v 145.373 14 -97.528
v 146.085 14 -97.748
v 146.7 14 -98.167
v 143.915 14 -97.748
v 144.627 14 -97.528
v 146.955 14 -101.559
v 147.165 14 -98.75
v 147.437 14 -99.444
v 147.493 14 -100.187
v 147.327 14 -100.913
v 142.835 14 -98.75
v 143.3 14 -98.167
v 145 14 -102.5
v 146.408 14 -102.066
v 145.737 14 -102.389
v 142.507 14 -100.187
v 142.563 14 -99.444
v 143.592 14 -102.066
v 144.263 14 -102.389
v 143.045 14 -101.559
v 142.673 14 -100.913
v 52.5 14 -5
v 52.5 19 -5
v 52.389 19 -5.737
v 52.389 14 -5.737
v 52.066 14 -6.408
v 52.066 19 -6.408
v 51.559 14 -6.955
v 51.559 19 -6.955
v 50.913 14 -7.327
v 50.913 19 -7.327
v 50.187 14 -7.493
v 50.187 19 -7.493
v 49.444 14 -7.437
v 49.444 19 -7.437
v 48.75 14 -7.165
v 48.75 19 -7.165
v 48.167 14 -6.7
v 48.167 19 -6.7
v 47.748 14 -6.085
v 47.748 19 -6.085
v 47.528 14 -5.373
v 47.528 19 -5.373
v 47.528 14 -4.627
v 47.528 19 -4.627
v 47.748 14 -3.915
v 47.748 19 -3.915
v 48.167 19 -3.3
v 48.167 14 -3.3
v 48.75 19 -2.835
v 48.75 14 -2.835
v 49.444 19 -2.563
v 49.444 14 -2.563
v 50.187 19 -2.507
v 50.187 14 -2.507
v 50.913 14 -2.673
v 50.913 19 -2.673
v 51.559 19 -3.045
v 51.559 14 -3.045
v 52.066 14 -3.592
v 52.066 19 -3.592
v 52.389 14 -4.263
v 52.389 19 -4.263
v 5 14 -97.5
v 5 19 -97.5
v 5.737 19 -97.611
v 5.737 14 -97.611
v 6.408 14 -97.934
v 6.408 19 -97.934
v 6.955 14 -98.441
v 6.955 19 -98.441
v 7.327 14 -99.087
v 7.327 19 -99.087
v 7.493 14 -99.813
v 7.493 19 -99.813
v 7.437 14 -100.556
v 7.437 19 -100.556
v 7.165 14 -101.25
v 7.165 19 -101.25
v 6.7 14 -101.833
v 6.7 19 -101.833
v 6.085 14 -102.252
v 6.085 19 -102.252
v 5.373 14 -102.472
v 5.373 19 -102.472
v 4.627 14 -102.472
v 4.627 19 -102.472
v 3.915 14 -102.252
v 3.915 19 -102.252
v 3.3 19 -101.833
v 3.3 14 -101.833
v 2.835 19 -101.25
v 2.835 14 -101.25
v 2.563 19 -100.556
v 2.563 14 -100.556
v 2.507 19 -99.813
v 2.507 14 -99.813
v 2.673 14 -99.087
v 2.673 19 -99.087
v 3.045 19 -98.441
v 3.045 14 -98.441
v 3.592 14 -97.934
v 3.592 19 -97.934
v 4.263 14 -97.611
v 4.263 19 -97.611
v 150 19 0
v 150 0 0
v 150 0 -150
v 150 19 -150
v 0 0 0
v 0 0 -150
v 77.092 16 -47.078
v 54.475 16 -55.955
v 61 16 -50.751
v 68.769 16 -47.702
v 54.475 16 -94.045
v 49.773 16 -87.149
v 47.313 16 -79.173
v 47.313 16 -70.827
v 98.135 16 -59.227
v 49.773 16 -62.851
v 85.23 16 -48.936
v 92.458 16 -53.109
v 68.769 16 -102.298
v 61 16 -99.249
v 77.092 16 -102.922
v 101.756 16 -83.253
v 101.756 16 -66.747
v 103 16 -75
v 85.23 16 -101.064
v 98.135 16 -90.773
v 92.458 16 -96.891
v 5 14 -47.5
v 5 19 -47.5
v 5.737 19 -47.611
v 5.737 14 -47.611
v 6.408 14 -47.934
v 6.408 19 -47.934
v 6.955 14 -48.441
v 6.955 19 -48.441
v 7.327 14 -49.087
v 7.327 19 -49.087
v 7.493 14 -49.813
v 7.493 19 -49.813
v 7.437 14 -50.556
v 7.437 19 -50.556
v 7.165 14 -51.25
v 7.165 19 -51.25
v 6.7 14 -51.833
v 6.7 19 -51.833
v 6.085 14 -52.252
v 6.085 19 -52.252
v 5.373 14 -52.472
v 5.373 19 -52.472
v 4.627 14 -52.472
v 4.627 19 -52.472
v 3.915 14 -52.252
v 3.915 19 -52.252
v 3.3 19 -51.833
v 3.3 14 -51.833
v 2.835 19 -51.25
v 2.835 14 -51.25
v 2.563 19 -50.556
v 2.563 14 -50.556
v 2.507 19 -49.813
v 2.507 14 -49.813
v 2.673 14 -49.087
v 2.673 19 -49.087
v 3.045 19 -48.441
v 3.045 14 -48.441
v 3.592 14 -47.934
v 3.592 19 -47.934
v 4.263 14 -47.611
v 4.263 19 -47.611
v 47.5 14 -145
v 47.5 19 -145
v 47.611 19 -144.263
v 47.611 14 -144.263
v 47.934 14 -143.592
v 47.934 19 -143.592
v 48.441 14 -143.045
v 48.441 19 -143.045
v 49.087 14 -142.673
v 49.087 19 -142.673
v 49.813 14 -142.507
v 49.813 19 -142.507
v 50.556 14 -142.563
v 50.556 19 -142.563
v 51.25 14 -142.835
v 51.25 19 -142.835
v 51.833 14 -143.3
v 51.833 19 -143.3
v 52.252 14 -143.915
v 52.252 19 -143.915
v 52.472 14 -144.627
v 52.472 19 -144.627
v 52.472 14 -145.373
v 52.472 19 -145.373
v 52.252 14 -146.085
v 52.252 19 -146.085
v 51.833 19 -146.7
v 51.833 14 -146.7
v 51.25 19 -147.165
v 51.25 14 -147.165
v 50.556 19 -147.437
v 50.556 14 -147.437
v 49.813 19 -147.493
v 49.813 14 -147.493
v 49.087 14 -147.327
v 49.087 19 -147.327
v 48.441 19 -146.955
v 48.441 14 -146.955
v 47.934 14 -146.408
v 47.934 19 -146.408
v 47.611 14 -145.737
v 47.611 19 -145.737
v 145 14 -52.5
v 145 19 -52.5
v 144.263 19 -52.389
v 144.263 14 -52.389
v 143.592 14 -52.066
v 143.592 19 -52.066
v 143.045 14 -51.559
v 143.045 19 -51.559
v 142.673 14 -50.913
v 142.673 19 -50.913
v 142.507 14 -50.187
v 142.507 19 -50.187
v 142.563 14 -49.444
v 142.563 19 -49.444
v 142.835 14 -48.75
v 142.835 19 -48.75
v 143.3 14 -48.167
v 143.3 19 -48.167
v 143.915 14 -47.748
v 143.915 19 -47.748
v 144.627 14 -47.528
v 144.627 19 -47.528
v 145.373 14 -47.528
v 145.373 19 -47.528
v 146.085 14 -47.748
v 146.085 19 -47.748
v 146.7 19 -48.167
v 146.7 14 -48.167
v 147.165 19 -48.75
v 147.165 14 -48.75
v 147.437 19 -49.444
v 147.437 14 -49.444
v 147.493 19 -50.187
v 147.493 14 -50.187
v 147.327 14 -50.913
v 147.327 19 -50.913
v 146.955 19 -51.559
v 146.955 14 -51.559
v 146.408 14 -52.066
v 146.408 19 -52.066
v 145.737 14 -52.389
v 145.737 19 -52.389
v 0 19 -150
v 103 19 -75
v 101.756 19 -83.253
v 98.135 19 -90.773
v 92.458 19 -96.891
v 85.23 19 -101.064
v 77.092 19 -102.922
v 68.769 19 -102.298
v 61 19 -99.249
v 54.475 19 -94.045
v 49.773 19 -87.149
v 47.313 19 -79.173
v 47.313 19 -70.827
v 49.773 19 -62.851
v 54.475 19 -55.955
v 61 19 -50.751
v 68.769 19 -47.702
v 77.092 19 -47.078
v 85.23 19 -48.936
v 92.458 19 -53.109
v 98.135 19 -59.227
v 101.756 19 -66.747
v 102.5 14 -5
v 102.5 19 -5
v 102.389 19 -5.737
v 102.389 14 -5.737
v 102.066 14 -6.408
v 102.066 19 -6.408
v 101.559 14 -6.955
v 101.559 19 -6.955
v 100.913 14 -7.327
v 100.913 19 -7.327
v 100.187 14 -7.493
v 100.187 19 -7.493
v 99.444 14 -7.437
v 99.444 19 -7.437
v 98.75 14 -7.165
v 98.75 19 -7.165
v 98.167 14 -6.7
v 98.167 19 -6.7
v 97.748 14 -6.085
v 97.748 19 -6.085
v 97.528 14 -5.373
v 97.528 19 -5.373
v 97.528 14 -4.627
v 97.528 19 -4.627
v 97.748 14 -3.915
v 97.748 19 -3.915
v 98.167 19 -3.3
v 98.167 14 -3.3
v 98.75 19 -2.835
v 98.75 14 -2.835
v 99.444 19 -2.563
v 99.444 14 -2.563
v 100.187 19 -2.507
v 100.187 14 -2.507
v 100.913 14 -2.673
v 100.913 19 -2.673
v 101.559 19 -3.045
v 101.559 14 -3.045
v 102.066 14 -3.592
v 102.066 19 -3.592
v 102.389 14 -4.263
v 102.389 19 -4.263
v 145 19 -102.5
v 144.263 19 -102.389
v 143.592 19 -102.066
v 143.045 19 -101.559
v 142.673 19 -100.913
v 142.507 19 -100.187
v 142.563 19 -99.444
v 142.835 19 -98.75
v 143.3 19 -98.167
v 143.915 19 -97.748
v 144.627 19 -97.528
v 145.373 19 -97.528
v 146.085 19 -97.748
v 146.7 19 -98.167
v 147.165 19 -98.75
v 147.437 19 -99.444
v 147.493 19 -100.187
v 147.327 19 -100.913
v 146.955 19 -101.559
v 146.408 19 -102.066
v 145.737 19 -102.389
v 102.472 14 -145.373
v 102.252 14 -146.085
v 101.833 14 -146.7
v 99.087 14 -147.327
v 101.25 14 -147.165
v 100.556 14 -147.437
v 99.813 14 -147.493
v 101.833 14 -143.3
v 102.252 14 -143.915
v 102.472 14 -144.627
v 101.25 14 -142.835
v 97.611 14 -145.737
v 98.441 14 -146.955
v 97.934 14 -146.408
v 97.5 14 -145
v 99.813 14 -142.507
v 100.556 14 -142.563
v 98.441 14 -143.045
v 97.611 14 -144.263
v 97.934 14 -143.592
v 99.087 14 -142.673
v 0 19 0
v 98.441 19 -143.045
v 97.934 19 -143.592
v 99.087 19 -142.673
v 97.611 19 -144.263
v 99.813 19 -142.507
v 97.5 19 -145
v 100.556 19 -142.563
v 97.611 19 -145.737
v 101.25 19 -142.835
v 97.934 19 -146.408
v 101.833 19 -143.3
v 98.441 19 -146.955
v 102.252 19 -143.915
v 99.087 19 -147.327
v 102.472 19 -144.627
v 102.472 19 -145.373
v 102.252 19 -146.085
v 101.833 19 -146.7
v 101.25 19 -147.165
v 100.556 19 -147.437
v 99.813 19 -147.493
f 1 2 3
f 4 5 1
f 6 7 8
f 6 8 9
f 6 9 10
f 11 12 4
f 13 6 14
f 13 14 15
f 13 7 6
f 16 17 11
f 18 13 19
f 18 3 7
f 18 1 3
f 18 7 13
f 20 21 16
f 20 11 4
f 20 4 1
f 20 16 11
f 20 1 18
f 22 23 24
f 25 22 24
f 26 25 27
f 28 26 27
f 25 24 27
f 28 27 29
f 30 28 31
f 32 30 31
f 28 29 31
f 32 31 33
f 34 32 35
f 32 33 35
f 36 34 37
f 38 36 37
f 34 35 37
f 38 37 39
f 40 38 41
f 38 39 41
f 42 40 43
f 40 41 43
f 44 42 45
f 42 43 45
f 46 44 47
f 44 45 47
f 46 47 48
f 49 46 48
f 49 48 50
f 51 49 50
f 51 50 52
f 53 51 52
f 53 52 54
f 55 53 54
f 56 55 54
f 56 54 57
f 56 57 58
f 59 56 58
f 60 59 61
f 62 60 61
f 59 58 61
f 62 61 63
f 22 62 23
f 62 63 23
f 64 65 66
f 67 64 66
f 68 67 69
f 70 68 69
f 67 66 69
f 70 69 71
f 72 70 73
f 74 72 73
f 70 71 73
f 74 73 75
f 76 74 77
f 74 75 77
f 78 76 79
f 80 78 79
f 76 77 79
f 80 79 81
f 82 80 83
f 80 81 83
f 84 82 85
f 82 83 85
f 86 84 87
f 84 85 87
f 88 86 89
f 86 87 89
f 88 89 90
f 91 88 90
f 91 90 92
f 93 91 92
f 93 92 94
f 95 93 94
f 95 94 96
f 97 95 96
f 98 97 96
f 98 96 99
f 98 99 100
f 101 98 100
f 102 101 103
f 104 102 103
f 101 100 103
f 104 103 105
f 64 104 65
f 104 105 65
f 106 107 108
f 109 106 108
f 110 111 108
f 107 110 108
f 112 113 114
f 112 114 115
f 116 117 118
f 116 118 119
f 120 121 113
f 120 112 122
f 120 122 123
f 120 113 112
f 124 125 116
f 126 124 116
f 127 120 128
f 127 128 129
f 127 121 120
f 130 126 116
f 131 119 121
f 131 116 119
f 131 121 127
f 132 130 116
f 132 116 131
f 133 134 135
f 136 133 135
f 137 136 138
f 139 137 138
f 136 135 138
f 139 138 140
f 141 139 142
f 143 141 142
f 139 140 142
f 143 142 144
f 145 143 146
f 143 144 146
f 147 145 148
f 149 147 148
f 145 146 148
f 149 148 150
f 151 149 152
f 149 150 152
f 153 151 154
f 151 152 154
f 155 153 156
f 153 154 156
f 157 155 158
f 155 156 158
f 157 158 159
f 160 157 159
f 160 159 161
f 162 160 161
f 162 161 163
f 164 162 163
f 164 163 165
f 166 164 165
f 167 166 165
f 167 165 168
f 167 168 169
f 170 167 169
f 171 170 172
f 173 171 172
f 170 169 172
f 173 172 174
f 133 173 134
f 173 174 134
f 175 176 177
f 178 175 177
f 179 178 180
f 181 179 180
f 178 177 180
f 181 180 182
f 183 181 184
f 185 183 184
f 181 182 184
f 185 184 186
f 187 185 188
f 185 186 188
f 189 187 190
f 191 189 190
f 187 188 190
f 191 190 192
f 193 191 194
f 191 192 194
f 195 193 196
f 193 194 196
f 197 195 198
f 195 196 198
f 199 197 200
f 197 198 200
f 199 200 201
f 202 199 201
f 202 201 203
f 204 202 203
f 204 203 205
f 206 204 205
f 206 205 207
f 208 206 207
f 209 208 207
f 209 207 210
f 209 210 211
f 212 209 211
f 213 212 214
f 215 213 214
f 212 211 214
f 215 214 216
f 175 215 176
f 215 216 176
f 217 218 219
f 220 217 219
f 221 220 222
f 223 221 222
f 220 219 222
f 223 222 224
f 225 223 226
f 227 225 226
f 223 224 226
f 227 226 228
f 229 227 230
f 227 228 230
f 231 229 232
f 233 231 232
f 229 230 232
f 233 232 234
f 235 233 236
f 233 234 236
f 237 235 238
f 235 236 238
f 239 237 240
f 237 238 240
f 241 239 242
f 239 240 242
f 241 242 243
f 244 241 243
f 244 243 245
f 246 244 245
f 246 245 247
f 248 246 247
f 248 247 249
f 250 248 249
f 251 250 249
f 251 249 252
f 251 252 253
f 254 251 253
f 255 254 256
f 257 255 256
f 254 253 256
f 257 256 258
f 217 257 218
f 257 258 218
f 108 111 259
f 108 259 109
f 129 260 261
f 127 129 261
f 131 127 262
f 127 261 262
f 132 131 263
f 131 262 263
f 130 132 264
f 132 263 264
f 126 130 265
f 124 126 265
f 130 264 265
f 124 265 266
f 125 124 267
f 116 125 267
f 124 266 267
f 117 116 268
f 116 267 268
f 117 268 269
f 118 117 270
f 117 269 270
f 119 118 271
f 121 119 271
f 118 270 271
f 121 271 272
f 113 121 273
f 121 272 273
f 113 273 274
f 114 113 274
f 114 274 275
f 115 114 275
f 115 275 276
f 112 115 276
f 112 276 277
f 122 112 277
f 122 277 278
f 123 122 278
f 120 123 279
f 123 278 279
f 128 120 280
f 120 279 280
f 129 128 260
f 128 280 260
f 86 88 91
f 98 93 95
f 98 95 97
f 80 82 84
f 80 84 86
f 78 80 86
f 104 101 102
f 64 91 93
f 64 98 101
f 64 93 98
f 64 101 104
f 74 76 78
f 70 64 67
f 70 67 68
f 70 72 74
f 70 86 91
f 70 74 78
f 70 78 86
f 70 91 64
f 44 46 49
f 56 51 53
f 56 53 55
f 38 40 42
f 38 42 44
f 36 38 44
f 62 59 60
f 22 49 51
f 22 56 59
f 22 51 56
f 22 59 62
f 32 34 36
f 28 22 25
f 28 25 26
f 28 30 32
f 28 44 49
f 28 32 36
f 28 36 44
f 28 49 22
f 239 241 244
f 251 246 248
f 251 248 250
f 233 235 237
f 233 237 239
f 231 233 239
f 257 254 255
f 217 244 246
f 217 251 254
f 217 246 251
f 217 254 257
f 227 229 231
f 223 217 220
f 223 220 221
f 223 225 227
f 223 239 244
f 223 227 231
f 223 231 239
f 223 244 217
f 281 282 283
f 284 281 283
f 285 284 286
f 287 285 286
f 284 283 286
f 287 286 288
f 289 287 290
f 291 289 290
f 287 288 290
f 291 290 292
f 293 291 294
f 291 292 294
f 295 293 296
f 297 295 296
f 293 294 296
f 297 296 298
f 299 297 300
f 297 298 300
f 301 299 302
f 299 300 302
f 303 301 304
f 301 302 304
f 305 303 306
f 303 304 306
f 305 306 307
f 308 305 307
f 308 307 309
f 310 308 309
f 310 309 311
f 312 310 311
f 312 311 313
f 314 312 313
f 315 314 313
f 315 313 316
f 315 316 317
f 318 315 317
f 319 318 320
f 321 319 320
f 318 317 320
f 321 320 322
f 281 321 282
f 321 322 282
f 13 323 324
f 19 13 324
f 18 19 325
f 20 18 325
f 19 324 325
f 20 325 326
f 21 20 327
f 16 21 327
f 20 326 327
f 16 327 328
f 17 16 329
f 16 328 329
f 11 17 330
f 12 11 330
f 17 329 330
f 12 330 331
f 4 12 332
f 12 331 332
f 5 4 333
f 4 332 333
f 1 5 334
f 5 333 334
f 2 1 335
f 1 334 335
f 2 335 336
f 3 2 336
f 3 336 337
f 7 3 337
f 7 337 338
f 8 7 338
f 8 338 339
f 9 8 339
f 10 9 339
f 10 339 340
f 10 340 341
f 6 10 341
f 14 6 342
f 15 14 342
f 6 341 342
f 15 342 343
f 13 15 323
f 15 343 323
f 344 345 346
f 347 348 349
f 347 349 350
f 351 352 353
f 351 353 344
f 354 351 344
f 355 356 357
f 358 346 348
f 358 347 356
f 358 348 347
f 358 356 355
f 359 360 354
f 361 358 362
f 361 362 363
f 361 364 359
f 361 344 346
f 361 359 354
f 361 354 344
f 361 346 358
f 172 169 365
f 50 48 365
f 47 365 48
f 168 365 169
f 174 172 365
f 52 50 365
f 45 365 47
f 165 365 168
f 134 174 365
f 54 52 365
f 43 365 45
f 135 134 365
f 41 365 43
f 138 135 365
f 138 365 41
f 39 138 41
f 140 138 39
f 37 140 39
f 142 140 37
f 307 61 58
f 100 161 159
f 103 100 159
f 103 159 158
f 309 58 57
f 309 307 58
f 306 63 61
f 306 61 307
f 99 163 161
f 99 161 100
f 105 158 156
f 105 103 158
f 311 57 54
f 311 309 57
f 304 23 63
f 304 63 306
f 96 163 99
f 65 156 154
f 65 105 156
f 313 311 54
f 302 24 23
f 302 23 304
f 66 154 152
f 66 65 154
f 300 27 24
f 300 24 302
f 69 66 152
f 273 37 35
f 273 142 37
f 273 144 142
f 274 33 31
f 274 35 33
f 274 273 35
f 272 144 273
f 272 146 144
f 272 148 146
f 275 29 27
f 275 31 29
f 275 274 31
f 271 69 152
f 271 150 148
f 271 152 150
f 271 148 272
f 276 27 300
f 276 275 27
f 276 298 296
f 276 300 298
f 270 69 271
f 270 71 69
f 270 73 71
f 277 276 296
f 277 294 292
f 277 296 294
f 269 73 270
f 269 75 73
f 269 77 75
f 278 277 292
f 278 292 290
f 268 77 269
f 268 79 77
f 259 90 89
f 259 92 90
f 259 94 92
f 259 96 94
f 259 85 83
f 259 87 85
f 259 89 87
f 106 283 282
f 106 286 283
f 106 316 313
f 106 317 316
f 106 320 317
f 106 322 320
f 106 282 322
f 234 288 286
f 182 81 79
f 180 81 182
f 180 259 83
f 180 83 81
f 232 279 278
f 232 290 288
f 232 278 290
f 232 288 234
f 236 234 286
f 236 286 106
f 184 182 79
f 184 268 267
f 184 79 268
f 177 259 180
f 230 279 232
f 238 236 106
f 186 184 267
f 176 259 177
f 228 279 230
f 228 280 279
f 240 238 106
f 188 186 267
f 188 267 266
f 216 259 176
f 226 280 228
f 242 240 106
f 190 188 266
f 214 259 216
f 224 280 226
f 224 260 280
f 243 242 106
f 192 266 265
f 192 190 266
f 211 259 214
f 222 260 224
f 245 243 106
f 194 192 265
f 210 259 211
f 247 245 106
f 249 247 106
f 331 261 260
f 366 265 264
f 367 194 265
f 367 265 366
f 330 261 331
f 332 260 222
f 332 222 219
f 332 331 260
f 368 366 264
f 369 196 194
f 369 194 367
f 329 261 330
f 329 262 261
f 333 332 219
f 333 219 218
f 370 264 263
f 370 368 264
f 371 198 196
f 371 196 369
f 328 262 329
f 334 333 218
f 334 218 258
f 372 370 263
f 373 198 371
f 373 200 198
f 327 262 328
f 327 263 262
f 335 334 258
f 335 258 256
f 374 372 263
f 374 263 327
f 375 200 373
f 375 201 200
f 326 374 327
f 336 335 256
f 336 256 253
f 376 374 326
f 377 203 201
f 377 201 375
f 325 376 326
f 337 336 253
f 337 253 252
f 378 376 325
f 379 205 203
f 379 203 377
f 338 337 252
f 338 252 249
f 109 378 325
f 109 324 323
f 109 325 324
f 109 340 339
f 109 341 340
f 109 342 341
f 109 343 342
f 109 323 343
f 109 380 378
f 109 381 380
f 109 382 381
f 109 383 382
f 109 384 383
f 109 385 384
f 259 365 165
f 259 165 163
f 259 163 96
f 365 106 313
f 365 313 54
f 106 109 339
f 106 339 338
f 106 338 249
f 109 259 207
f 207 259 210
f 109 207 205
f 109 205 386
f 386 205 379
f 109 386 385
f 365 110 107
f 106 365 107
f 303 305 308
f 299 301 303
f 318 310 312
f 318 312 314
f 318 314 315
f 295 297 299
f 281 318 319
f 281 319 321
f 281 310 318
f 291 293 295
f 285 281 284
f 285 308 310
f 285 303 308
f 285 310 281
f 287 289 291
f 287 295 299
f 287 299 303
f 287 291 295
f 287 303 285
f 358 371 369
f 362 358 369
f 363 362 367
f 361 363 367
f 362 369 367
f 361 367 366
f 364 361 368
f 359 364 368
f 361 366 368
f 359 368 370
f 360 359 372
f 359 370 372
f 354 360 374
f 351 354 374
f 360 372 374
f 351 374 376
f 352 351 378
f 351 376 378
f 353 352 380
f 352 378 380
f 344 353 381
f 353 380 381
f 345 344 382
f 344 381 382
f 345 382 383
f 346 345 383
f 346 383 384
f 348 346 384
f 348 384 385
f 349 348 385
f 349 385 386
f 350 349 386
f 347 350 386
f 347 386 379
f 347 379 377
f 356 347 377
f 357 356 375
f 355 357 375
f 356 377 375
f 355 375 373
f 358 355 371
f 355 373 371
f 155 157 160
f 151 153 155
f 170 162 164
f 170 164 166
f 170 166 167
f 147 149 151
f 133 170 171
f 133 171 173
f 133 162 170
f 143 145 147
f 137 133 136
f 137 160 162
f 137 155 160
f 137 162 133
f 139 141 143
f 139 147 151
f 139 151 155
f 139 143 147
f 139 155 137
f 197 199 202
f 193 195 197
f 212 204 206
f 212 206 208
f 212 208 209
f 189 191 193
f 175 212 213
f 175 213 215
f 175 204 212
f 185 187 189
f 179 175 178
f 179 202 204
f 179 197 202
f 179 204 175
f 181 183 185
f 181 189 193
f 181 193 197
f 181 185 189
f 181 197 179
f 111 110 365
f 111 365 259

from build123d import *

# Parameters (mm, degrees)
SKETCH1_W           = 150
SKETCH1_H           = 150
BOSS_EXTRUDE1_DEPTH = 19
SKETCH2_R           = 28
CUT_EXTRUDE1_DEPTH  = 3
SKETCH3_R           = 2.5
CUT_EXTRUDE2_DEPTH  = 5
CIRPATTERN1_COUNT   = 4


with BuildPart() as part:
    # Sketch1 → Boss-Extrude1 (new body)
    with BuildSketch(Plane(origin=(0, 0, 0), x_dir=(1, 0, 0), z_dir=(0, 1, 0))):
        with Locations((75, 75)):
            Rectangle(SKETCH1_W, SKETCH1_H)
    extrude(amount=BOSS_EXTRUDE1_DEPTH)

    # Sketch2 → Cut-Extrude1 (cut)
    with BuildSketch(Plane(origin=(0, 19, 0), x_dir=(1, 0, 0), z_dir=(0, 1, 0))):
        with Locations((75, 75)):
            Circle(SKETCH2_R)
    extrude(amount=-CUT_EXTRUDE1_DEPTH, mode=Mode.SUBTRACT)

    # Sketch3 → Cut-Extrude2 (cut)
    with BuildSketch(Plane(origin=(0, 19, 0), x_dir=(1, 0, 0), z_dir=(0, 1, 0))):
        with Locations((100, 5)):
            Circle(SKETCH3_R)
        with Locations((50, 5)):
            Circle(SKETCH3_R)
    cut_extrude2 = extrude(amount=-CUT_EXTRUDE2_DEPTH, mode=Mode.SUBTRACT)

    # CirPattern1: Cut-Extrude2 ×4 about axis
    cirpattern1_axis = Axis((75, 16, -75), (0, 1, 0))
    for i in range(1, CIRPATTERN1_COUNT):
        add(cut_extrude2.rotate(cirpattern1_axis, i * 360 / CIRPATTERN1_COUNT), mode=Mode.SUBTRACT)


solid = part.part
